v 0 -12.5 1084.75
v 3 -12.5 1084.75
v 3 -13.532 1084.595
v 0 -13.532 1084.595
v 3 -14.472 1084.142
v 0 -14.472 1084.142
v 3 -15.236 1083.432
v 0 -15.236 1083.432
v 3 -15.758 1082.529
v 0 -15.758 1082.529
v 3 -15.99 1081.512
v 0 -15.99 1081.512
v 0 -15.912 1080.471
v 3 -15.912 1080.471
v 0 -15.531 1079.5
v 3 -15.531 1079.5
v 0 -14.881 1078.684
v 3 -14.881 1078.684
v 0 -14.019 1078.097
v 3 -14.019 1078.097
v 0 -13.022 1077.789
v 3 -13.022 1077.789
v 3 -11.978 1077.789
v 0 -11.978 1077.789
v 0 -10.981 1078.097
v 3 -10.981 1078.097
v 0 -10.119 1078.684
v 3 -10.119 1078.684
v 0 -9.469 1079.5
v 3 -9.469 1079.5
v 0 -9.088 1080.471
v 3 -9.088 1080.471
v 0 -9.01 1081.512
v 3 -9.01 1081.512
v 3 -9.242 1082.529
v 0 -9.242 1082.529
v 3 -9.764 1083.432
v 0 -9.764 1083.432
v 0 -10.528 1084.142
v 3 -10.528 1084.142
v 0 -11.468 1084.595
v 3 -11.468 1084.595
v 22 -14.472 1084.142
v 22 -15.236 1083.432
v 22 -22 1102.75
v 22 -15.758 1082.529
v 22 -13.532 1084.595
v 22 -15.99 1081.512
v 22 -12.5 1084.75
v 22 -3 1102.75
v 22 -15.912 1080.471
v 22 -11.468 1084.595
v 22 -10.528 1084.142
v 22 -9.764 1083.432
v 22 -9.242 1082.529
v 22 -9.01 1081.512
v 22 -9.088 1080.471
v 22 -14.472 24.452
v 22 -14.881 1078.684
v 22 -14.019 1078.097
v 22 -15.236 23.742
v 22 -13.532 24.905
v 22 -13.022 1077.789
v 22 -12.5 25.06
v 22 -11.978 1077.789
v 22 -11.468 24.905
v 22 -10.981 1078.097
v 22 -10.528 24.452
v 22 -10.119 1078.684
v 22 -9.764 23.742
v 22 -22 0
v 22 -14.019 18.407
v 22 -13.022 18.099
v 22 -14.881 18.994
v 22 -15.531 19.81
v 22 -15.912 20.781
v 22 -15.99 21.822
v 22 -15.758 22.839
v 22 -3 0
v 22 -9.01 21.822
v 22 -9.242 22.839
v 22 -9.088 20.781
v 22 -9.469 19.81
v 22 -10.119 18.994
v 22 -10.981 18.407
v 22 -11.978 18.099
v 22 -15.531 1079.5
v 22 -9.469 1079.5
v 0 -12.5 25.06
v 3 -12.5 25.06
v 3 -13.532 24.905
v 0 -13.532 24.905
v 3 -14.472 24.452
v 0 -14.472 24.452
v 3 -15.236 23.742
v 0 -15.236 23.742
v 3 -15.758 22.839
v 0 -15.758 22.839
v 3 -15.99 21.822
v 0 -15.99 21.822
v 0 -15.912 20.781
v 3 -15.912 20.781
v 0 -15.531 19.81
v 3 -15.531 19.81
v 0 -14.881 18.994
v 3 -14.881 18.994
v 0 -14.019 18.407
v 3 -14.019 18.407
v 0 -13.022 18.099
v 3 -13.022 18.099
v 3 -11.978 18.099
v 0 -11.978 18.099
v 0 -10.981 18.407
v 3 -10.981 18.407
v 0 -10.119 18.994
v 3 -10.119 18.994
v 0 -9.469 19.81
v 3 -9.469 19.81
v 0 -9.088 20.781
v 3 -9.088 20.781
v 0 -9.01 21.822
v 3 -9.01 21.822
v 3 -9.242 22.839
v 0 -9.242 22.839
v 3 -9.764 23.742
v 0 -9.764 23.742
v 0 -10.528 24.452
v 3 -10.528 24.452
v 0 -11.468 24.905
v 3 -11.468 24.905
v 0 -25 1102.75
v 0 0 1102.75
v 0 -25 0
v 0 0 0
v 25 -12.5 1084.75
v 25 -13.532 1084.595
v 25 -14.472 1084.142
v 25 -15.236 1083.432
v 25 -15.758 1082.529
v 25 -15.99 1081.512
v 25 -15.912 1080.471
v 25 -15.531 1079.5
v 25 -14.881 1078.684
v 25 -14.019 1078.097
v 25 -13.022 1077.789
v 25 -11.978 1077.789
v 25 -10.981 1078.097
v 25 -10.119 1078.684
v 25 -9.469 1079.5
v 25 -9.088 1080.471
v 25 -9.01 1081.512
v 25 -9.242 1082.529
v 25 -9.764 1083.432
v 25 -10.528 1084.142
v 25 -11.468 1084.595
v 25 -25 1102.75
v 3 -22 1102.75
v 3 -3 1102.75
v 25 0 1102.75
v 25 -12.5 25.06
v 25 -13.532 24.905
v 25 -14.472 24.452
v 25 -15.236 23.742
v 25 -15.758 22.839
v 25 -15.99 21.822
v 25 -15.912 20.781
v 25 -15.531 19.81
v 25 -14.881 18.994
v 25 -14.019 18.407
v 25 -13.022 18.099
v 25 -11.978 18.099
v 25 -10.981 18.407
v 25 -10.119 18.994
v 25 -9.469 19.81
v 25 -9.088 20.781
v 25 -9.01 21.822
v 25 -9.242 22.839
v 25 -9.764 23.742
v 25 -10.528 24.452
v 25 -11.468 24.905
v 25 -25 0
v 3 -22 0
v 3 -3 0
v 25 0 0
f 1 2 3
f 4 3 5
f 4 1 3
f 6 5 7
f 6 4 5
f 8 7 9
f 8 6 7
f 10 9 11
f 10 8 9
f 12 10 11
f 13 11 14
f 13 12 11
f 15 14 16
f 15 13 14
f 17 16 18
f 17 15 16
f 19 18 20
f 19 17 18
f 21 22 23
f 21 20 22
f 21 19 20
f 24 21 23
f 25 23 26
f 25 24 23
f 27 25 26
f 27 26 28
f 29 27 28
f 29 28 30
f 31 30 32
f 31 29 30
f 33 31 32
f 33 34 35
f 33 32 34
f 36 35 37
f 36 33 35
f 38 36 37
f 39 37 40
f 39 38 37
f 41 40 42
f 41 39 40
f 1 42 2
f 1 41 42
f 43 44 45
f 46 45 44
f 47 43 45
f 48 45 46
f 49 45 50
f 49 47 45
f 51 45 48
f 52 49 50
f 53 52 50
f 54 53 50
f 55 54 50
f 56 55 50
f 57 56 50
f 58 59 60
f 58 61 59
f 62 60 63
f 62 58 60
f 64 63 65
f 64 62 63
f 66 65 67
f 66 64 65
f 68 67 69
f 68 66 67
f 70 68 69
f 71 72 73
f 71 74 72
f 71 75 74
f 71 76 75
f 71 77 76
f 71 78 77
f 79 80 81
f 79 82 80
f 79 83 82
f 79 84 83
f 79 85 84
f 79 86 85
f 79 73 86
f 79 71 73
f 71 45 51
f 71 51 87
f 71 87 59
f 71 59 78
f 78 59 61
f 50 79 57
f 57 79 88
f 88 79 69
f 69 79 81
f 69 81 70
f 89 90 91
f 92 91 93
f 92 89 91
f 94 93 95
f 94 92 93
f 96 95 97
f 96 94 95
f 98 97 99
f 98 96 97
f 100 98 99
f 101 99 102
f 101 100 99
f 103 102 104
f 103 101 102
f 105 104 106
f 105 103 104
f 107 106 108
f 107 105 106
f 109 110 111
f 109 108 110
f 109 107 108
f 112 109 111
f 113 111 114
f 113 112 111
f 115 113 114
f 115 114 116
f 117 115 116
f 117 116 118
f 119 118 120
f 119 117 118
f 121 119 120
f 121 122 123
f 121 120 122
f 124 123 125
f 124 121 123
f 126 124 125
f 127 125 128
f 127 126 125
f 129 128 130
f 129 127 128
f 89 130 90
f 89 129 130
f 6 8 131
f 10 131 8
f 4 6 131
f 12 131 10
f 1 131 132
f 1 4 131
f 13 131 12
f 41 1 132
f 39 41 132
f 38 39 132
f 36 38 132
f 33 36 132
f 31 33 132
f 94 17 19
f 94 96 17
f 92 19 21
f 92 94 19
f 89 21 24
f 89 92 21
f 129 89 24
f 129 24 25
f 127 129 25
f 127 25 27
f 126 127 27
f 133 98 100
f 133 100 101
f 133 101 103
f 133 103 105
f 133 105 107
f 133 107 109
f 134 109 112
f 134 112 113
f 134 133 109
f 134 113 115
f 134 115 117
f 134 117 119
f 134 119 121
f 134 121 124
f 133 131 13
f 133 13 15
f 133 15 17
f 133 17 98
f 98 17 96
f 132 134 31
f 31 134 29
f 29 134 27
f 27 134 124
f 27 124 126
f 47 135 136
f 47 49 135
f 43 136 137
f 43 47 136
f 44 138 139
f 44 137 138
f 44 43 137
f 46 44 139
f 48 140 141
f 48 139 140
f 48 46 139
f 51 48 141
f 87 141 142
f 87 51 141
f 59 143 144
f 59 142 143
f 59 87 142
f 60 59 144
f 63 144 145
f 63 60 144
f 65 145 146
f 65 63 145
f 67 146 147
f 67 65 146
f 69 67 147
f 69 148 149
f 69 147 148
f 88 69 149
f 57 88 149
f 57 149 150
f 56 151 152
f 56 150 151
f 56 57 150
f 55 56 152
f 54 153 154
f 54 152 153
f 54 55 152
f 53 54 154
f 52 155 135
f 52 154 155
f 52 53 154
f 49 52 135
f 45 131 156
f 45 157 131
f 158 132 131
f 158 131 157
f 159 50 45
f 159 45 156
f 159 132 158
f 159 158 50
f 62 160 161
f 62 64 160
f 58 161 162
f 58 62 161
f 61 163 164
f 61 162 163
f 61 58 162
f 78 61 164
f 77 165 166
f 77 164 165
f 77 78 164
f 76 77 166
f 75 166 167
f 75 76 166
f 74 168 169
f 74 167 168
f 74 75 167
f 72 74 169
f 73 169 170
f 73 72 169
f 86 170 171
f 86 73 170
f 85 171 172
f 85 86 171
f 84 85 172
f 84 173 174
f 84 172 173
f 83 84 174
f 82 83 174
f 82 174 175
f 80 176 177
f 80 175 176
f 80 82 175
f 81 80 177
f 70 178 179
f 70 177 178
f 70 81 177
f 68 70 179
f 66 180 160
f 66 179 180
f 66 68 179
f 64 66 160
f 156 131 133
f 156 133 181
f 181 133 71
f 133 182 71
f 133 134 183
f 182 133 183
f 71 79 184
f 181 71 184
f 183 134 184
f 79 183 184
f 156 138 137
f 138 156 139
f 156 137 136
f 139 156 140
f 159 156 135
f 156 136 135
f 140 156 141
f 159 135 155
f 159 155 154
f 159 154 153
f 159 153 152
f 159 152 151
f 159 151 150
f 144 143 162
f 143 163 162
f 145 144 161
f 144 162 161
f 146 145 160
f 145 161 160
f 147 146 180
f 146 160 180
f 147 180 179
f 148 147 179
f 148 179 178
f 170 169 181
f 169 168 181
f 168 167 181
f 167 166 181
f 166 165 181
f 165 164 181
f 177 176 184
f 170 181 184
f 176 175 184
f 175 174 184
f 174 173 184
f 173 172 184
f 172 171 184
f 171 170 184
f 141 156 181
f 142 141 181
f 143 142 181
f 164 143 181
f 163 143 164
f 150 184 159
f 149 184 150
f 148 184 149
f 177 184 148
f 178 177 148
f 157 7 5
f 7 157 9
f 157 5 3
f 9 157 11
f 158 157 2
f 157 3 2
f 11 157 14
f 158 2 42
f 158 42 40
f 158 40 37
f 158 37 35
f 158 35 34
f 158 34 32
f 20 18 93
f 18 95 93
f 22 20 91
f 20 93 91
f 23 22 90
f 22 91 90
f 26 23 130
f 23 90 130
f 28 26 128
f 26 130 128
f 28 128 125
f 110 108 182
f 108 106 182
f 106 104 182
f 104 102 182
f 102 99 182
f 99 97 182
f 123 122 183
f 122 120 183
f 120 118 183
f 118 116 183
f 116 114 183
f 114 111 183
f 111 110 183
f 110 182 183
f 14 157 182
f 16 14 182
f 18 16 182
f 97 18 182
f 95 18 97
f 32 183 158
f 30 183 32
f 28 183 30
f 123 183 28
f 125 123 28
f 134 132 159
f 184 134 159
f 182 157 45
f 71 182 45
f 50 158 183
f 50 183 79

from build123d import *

# Parameters (mm, degrees)
SKETCH_1_W             = 25
SKETCH_1_H             = 25
SKETCH_1_W_2           = 19
SKETCH_1_H_2           = 19
EXTRUDE_1_DEPTH        = 1102.75
PATTERN_LINEAR_1_COUNT = 2
PATTERN_LINEAR_1_PITCH = 1059.69


with BuildPart() as part:
    # 草图1 → 拉伸1 (new body)
    with BuildSketch(Plane.XY):
        with Locations((12.5, -12.5)):
            Rectangle(SKETCH_1_W, SKETCH_1_H)
        with Locations((12.5, -12.5)):
            Rectangle(SKETCH_1_W_2, SKETCH_1_H_2, mode=Mode.SUBTRACT)
    extrude(amount=EXTRUDE_1_DEPTH)

    # 草图4 → Ø7.0 (7) 直径孔1 (revolve, cut)
    with BuildSketch(Plane(origin=(0, -12.5, 1081.25), x_dir=(0, 0, 1), z_dir=(0, 1, 0))):
        Polygon((0, 0), (0, 32.103012167), (3.5, 30), (3.5, 0), align=None)
    hole_wizard_7_0_7_1 = revolve(axis=Axis((-6.35, -12.5, 1081.25), (1, 0, 0)), mode=Mode.SUBTRACT)

    # 阵列(线性)1: Ø7.0 (7) 直径孔1 ×2
    with Locations(*[(0, 0, -i * PATTERN_LINEAR_1_PITCH) for i in range(1, PATTERN_LINEAR_1_COUNT)]):
        add(hole_wizard_7_0_7_1, mode=Mode.SUBTRACT)


solid = part.part
